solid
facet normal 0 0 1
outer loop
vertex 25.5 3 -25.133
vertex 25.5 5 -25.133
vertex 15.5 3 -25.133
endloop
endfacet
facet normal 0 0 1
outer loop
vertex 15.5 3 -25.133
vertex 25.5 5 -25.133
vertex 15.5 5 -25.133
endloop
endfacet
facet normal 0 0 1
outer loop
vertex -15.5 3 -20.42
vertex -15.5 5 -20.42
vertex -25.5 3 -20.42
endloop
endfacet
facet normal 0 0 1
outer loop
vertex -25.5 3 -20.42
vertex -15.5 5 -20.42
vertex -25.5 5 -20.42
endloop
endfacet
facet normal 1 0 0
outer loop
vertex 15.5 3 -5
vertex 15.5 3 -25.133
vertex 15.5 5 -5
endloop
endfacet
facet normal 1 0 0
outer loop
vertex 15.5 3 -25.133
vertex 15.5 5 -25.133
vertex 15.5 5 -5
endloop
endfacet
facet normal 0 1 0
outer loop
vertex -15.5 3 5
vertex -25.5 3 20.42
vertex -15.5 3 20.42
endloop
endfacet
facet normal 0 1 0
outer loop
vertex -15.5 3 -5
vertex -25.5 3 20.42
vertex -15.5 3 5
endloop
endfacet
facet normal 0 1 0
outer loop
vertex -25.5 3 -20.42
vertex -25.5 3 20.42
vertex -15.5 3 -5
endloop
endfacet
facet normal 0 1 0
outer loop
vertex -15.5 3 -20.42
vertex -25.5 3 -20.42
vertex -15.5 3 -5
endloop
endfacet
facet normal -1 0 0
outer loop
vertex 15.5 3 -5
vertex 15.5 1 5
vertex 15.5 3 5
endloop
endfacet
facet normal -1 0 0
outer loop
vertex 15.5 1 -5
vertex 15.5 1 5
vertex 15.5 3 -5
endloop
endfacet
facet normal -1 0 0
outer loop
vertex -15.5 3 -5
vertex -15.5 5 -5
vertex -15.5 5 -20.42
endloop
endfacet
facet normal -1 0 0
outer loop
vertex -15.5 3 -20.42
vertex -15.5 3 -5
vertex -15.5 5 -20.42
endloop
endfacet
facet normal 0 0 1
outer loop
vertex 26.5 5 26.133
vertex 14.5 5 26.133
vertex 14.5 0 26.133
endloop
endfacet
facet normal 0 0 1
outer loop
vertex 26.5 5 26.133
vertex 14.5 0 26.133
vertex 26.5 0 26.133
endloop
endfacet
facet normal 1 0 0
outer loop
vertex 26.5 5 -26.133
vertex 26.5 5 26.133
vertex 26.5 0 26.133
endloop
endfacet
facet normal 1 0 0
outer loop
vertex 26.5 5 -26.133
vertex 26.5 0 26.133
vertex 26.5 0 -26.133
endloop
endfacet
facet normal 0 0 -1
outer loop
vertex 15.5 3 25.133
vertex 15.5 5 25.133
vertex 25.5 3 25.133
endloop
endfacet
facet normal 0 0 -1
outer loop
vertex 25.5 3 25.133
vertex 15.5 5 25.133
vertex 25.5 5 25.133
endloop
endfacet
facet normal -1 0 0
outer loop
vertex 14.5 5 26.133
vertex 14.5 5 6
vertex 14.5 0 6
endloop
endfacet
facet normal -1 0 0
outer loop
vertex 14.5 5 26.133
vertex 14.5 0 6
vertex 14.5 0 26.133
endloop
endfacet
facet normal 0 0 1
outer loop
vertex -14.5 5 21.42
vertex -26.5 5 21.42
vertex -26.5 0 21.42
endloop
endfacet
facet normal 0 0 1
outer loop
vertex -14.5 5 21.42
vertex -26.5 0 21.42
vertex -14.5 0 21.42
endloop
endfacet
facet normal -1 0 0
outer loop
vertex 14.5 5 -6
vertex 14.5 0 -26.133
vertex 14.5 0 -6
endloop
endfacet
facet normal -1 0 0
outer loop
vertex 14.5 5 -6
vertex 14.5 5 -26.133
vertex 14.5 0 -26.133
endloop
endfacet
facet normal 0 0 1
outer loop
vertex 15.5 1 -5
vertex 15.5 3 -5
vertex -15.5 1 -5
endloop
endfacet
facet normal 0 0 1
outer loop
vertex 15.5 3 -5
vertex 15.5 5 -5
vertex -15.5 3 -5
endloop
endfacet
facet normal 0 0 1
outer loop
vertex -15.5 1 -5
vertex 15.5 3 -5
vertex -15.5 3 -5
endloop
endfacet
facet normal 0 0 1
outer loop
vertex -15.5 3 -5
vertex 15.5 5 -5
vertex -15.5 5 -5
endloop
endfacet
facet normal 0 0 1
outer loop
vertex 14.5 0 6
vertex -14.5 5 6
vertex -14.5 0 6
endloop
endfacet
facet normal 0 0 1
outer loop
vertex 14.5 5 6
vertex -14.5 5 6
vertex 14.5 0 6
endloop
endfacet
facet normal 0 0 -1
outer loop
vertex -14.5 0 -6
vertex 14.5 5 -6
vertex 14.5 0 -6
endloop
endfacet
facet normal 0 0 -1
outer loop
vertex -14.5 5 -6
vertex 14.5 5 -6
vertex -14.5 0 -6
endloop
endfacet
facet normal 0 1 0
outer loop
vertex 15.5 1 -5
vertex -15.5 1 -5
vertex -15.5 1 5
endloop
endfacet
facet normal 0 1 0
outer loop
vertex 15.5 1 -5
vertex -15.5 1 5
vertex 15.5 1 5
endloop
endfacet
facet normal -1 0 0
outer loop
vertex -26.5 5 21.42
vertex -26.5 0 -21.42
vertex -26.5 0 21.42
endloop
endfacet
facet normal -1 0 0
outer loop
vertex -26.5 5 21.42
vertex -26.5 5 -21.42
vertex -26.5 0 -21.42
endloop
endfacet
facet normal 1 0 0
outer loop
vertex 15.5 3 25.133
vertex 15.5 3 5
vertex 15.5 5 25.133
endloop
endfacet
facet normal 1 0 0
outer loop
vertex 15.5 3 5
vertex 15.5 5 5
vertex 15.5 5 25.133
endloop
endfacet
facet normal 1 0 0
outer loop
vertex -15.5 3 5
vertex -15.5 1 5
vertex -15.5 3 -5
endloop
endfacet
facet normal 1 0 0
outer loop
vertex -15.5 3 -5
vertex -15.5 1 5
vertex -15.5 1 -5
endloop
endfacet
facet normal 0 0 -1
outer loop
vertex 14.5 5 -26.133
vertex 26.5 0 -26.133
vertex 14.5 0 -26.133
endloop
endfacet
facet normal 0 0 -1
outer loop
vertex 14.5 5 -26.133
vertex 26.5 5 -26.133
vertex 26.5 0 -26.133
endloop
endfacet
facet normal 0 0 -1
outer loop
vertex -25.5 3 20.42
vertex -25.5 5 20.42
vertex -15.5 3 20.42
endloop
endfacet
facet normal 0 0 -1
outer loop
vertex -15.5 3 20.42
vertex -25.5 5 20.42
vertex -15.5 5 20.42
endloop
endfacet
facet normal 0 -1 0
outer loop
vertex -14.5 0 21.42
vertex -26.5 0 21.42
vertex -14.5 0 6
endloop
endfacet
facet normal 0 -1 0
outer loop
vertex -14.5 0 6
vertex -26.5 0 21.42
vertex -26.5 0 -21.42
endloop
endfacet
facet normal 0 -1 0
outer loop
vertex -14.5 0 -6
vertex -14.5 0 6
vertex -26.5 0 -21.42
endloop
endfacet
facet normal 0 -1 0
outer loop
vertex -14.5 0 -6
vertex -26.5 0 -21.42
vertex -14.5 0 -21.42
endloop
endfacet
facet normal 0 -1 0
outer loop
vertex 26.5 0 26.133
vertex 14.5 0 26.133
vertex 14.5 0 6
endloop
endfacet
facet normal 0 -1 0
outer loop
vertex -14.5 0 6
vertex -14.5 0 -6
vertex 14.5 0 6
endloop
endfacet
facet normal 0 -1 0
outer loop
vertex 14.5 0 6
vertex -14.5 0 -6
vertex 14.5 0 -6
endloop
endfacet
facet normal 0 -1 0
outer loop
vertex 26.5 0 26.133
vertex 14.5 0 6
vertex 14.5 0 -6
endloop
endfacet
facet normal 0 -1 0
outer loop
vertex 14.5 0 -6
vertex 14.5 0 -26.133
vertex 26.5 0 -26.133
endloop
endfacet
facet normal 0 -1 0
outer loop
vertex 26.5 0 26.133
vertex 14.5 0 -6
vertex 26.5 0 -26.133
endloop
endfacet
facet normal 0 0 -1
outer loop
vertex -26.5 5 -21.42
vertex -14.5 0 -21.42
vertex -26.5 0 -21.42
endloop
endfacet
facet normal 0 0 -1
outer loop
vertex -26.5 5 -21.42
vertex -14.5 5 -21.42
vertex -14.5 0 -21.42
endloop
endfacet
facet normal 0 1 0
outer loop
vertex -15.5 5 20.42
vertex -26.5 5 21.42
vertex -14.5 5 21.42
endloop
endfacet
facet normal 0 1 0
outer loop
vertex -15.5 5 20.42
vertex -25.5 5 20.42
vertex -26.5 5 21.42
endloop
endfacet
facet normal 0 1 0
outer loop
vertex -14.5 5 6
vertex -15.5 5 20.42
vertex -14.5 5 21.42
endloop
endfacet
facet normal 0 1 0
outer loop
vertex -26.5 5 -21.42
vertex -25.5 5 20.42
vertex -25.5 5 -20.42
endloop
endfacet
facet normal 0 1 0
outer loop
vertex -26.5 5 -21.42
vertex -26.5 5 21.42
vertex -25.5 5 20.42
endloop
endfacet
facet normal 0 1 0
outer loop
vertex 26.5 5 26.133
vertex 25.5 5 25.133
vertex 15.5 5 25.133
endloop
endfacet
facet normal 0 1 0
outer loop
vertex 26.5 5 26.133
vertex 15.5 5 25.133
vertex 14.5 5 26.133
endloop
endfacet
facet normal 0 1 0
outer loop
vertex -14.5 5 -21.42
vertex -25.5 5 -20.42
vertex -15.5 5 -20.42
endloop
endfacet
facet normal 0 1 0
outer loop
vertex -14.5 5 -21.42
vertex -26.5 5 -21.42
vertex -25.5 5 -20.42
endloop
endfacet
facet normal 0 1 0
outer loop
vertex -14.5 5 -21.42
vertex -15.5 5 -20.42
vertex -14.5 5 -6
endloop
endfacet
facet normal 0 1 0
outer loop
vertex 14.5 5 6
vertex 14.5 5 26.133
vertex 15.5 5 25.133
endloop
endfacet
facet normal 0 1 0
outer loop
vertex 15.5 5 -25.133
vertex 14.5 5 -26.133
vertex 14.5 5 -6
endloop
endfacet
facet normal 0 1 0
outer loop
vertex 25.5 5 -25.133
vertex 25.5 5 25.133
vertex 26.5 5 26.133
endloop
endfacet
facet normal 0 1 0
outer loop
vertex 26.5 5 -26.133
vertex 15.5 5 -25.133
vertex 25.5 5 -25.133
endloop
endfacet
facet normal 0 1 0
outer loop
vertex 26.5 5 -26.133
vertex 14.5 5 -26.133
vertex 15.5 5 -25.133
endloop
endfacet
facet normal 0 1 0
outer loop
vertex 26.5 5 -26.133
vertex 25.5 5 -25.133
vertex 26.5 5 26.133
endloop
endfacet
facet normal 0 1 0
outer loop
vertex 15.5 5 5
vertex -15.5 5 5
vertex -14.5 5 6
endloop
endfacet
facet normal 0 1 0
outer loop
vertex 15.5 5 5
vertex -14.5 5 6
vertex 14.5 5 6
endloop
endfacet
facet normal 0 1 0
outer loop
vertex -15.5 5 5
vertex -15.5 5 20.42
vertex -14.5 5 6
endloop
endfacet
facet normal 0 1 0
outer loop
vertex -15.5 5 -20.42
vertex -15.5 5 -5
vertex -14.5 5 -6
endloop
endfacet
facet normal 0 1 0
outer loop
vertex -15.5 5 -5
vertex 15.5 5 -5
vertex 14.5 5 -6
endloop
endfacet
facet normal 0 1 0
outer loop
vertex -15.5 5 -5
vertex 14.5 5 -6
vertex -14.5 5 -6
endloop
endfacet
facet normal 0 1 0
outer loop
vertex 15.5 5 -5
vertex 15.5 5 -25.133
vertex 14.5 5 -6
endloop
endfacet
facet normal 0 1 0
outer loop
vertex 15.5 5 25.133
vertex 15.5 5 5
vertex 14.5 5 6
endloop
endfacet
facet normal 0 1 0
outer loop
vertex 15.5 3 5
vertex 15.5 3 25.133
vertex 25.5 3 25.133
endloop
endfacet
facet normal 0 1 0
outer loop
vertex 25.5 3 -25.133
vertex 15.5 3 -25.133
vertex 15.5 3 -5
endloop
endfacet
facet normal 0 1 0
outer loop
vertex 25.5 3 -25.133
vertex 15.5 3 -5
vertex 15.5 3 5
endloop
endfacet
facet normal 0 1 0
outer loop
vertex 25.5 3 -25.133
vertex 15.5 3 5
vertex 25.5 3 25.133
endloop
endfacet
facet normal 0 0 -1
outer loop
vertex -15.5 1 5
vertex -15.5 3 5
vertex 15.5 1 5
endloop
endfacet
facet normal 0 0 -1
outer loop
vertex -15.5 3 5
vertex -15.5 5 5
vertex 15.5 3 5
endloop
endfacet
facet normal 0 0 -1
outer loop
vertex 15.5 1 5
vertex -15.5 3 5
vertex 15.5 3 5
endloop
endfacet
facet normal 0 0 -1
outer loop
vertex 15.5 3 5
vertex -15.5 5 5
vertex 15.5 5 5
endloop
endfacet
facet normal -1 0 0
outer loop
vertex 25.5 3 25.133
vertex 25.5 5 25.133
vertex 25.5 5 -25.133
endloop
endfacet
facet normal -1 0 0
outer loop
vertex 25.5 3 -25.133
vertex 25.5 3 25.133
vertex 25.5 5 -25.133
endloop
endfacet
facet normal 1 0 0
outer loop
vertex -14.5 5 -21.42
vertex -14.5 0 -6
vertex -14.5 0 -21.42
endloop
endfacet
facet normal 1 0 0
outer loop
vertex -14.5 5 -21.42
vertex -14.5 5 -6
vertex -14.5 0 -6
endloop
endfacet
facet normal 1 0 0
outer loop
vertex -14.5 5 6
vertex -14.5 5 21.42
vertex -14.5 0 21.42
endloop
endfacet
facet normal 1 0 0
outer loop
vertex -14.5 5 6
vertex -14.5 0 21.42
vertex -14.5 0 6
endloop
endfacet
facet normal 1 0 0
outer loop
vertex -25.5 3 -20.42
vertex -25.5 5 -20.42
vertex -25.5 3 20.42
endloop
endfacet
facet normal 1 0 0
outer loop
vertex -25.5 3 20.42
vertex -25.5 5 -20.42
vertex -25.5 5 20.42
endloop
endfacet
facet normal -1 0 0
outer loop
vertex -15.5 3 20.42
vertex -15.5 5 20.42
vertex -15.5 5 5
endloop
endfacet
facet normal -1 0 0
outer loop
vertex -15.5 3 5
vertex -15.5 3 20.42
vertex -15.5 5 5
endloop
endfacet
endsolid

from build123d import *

# Parameters (mm, degrees)
SKETCH_1_W           = 10
SKETCH_1_H           = 15.42
SKETCH_1_H_2         = 10
SKETCH_1_W_2         = 31
SKETCH_1_H_3         = 20.133
EXTRUDE_1_DEPTH      = 1
EXTRUDE_2_DEPTH      = 4
EXTRUDE_2_DEPTH_BACK = 1
SKETCH_3_W           = 10
SKETCH_3_H           = 40.84
SKETCH_3_H_2         = 50.266
EXTRUDE_3_DEPTH      = 2


with BuildPart() as part:
    # 草图1 → 凸台-拉伸1 (new body)
    with BuildSketch(Plane(origin=(0, 0, 0), x_dir=(1, 0, 0), z_dir=(0, 1, 0))):
        with Locations((-20.5, 12.71)):
            Rectangle(SKETCH_1_W, SKETCH_1_H)
        with Locations((-20.5, 0)):
            Rectangle(SKETCH_1_W, SKETCH_1_H_2)
        with Locations((-20.5, -12.71)):
            Rectangle(SKETCH_1_W, SKETCH_1_H)
        Rectangle(SKETCH_1_W_2, SKETCH_1_H_2)
        with Locations((20.5, 15.0665)):
            Rectangle(SKETCH_1_W, SKETCH_1_H_3)
        with Locations((20.5, 0)):
            Rectangle(SKETCH_1_W, SKETCH_1_H_2)
        with Locations((20.5, -15.0665)):
            Rectangle(SKETCH_1_W, SKETCH_1_H_3)
    extrude(amount=EXTRUDE_1_DEPTH)



with BuildPart() as body_2:
    # 草图2 → 凸台-拉伸2 (new body, two sides)
    with BuildSketch(Plane(origin=(0, 1, 0), x_dir=(1, 0, 0), z_dir=(0, 1, 0))) as extrude_2_sk:
        Polygon((-26.5, 21.42), (-26.5, -21.42), (-14.5, -21.42), (-14.5, -6), (14.5, -6), (14.5, -26.133), (26.5, -26.133), (26.5, 26.133), (14.5, 26.133), (14.5, 6), (-14.5, 6), (-14.5, 21.42), align=None)
        Polygon((-15.5, -5), (15.5, -5), (15.5, -25.133), (25.5, -25.133), (25.5, 25.133), (15.5, 25.133), (15.5, 5), (-15.5, 5), (-15.5, 20.42), (-25.5, 20.42), (-25.5, -20.42), (-15.5, -20.42), align=None, mode=Mode.SUBTRACT)
    extrude(amount=EXTRUDE_2_DEPTH)
    extrude(extrude_2_sk.sketch, amount=-EXTRUDE_2_DEPTH_BACK)


with BuildPart() as part_1:
    add(part.part)

    add(body_2.part)  # 凸台-拉伸3 merges body 2
    # 草图3 → 凸台-拉伸3 (add)
    with BuildSketch(Plane(origin=(0, 1, 0), x_dir=(1, 0, 0), z_dir=(0, 1, 0))):
        with Locations((-20.5, 0)):
            Rectangle(SKETCH_3_W, SKETCH_3_H)
        with Locations((20.5, 0)):
            Rectangle(SKETCH_3_W, SKETCH_3_H_2)
    extrude(amount=EXTRUDE_3_DEPTH)


solid = part_1.part
